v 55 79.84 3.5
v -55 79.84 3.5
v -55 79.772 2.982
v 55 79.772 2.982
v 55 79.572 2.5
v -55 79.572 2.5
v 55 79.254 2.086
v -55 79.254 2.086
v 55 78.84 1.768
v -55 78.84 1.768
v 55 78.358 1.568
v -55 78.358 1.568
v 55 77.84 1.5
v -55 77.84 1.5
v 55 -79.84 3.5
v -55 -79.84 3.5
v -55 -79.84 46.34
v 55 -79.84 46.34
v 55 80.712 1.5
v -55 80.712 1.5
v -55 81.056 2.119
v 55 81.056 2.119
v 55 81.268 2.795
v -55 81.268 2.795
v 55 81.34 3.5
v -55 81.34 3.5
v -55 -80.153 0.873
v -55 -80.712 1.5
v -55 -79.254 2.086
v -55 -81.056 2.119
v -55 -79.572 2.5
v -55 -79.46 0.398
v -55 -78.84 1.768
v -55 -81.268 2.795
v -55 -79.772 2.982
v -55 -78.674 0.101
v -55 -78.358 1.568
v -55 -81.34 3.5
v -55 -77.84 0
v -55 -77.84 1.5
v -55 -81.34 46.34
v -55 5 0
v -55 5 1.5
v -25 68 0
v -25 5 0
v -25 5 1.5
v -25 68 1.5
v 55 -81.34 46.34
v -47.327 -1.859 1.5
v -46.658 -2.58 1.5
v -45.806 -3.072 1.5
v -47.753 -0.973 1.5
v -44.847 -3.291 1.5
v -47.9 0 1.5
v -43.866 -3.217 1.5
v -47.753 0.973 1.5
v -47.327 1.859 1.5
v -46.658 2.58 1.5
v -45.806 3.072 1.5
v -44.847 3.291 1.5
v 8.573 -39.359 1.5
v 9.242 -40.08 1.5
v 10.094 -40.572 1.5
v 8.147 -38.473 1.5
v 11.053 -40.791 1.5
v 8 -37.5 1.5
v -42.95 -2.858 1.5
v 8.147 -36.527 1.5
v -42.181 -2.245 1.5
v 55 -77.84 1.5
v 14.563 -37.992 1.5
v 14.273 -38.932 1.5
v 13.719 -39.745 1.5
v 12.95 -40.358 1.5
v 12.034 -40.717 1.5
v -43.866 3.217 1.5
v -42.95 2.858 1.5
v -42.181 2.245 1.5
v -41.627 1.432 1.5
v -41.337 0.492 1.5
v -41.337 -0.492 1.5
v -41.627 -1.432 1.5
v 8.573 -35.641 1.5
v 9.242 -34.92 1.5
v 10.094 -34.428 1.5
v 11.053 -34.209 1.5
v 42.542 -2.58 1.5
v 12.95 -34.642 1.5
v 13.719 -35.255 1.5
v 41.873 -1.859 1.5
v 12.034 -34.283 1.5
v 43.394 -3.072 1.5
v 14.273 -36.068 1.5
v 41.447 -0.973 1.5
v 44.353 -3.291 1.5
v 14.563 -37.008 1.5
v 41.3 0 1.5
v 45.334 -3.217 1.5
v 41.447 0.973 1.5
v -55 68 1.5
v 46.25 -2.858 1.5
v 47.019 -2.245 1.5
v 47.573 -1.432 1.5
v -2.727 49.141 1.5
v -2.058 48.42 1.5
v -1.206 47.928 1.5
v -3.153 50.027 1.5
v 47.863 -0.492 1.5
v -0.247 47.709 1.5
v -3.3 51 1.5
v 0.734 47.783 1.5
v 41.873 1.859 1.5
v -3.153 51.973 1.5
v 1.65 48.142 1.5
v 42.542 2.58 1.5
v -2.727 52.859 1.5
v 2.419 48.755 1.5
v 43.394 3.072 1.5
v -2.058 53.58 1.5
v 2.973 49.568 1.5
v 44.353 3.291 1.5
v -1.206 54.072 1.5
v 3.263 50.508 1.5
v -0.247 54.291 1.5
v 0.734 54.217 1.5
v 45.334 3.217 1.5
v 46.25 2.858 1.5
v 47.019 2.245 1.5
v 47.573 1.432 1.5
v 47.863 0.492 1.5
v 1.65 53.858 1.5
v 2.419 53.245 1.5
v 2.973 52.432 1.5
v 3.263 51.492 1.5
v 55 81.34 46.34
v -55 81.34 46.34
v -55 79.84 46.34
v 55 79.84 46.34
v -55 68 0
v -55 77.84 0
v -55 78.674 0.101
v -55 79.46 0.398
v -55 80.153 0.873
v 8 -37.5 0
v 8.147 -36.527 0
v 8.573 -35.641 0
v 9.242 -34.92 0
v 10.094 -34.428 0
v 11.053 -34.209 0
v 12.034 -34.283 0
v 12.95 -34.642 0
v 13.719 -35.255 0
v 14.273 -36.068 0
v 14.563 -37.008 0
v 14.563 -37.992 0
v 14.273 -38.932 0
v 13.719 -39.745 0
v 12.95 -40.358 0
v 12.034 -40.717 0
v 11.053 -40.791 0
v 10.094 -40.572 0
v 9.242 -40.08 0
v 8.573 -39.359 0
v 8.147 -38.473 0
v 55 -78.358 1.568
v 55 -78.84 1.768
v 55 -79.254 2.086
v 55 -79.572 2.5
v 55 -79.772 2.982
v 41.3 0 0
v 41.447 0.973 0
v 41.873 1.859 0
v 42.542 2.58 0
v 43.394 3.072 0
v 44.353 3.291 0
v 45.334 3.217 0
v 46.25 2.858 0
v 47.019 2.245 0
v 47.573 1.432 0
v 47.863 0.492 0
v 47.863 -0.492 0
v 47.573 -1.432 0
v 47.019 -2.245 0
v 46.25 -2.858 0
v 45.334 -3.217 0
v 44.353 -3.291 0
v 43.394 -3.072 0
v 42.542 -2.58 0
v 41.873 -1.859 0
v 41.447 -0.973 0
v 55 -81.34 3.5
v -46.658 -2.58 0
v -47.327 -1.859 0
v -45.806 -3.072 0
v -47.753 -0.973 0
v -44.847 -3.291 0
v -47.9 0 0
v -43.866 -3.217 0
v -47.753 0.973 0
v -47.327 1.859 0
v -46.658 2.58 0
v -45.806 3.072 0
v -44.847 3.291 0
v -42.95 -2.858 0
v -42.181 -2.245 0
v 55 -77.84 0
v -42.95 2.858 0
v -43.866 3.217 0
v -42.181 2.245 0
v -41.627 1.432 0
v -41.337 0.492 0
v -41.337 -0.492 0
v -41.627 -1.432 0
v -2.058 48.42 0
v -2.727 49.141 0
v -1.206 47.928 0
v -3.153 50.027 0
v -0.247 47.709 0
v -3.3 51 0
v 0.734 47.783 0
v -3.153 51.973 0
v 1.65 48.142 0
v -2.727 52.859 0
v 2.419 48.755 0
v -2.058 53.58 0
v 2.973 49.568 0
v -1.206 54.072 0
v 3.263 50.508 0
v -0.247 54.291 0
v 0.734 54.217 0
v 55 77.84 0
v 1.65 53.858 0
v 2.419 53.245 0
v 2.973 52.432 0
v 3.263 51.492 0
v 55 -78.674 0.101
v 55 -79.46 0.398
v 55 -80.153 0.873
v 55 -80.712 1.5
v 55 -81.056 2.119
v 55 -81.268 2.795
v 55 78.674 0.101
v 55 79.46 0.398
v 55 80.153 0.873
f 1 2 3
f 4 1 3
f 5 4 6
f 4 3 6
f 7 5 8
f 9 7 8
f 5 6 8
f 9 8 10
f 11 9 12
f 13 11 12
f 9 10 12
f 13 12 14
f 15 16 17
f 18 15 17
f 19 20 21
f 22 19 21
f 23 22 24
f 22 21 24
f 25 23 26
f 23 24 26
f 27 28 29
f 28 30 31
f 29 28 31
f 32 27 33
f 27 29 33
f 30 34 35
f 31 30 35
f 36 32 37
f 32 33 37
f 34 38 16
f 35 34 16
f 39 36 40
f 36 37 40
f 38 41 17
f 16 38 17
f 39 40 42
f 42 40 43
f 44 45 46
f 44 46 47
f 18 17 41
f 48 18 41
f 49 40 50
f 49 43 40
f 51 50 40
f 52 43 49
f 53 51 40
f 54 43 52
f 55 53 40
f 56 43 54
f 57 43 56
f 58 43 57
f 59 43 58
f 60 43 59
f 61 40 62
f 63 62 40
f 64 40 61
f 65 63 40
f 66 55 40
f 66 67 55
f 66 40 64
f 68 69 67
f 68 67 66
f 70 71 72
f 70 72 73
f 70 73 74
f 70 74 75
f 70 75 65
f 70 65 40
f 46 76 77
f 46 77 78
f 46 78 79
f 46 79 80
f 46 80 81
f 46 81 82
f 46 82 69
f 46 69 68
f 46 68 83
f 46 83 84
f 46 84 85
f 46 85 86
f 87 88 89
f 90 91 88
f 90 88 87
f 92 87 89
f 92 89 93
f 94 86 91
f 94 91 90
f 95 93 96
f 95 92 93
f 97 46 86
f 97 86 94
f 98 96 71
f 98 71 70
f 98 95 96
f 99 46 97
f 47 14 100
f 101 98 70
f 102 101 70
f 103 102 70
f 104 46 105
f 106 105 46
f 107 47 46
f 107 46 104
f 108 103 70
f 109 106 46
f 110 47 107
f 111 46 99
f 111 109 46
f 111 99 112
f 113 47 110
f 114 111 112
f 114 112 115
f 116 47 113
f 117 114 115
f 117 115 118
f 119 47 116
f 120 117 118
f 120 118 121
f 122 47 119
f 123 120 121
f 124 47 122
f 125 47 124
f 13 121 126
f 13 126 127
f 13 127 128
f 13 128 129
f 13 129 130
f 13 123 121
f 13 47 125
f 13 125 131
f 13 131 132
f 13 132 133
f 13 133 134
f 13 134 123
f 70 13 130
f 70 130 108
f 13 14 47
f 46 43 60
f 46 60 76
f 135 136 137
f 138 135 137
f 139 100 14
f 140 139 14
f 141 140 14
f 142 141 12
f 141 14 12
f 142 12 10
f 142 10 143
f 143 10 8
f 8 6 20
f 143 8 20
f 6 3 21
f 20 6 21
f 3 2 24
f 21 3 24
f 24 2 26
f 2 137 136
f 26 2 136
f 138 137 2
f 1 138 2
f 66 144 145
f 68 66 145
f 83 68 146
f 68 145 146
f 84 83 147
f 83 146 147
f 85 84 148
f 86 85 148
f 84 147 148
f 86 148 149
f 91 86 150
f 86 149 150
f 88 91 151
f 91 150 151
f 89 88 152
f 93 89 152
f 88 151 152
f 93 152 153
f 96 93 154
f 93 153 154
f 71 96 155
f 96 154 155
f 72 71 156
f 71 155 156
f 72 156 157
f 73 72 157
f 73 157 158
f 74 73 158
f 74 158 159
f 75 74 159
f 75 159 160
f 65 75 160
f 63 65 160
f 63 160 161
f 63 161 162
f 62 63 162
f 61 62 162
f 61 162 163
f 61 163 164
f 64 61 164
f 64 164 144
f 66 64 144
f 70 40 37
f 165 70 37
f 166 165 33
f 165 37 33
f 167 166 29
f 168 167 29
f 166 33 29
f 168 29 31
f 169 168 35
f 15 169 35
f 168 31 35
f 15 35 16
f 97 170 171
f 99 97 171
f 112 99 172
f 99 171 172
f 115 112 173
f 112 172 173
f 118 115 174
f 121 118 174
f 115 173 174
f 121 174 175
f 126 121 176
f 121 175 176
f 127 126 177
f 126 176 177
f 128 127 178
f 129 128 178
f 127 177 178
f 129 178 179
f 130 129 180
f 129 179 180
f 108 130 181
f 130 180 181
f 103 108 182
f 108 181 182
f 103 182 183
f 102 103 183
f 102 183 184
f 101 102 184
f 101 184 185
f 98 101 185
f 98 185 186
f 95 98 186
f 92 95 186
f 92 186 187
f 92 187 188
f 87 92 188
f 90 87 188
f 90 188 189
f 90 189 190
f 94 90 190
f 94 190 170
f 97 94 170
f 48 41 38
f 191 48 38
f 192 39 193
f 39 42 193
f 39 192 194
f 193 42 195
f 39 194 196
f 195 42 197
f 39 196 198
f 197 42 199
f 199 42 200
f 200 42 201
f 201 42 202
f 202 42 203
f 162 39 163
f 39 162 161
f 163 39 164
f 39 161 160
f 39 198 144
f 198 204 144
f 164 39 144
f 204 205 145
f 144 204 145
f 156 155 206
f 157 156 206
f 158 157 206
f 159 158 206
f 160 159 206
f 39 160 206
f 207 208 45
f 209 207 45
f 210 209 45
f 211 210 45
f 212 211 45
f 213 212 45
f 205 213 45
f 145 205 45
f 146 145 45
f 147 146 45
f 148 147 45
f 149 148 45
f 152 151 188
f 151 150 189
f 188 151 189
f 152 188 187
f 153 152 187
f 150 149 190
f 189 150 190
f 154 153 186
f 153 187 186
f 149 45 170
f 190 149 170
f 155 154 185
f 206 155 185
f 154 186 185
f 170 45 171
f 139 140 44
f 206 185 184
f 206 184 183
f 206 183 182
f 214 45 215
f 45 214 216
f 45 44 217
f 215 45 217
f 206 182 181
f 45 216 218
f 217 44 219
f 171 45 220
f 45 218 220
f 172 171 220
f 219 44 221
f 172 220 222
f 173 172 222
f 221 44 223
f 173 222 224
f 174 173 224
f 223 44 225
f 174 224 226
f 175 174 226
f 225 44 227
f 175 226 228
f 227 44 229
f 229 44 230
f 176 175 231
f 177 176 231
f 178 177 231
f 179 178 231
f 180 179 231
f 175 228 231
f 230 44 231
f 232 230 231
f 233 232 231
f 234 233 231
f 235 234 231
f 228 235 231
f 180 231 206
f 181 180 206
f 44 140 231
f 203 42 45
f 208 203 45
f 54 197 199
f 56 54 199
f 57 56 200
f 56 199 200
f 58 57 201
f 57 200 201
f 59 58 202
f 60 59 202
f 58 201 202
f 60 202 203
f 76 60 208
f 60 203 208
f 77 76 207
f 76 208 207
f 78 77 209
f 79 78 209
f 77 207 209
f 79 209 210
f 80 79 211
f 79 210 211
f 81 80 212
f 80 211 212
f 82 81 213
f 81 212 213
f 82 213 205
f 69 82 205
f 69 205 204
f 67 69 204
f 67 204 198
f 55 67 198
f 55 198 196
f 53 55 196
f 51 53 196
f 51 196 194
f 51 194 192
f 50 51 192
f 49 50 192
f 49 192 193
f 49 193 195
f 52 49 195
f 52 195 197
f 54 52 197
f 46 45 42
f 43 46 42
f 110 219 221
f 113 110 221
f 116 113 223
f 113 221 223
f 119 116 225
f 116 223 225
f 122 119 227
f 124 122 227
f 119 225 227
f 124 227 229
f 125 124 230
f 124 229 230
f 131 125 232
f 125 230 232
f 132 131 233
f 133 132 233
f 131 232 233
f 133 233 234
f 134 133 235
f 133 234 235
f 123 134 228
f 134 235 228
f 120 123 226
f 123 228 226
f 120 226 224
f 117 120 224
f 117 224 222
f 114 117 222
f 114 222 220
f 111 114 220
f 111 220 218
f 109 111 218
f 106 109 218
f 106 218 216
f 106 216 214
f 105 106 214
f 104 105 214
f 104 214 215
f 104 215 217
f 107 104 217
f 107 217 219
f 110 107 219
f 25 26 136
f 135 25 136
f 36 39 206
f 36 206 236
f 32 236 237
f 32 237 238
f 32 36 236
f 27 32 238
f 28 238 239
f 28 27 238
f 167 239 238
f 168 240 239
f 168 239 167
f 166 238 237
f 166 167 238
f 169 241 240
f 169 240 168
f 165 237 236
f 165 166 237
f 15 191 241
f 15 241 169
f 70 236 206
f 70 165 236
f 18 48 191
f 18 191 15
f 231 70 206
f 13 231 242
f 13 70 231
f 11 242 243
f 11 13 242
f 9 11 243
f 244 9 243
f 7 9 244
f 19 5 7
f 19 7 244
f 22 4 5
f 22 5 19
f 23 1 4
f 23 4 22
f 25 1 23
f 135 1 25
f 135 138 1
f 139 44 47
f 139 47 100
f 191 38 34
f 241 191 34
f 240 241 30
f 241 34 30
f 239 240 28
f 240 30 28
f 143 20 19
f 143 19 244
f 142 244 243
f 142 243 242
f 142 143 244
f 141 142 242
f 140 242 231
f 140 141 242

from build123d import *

# Parameters (mm, degrees)
ESBO_O1_W                   = 110
ESBO_O1_H                   = 250
RESSALTO_EXTRUS_O1_DEPTH    = 1.5
FURO_COM_FOLGA_DE_M62_D     = 6.6
FURO_COM_FOLGA_DE_M62_DEPTH = 10
FURO_COM_FOLGA_DE_M62_TIP   = 1.982840043
DOBRA_START                 = -55
DOBRA_ESBO_ADA1_DEPTH       = 110
DOBRA_ESBO_ADA1_2_DEPTH     = 110
DOBRA_ESBO_ADA2_DEPTH       = 110
DOBRA_ESBO_ADA2_2_DEPTH     = 110
ESBO_O12_W                  = 30
ESBO_O12_H                  = 63
CORTE_EXTRUS_O1_DEPTH       = 10


# Read off the part's stored shape, not the designer's step: Dobra esboçada1, Dobra esboçada2
with BuildPart() as part:
    # Esboço1 → Ressalto-extrusão1 (new body)
    with BuildSketch(Plane.XY):
        Rectangle(ESBO_O1_W, ESBO_O1_H)
    extrude(amount=RESSALTO_EXTRUS_O1_DEPTH)

    # Furo com folga de M62
    with Locations(Plane.XY.offset(1.5)):
        with Locations((0, 51), (-44.6, 0), (44.6, 0), (11.3, -37.5)):
            Hole(FURO_COM_FOLGA_DE_M62_D / 2, depth=FURO_COM_FOLGA_DE_M62_DEPTH)
            with Locations((0, 0, -(FURO_COM_FOLGA_DE_M62_DEPTH + FURO_COM_FOLGA_DE_M62_TIP / 2))):  # 118° drill point
                Cone(0, FURO_COM_FOLGA_DE_M62_D / 2, FURO_COM_FOLGA_DE_M62_TIP, mode=Mode.SUBTRACT)

    # Dobra esboçada1 outline → Dobra esboçada1 (cut)
    with BuildSketch(Plane.YZ.offset(DOBRA_START)):
        with BuildLine():
            ThreePointArc((-77.840155051, 0), (-79.460340225, 0.397581589), (-80.712436374, 1.5))
            Line((-80.712436374, 1.5), (-125, 1.5))
            Line((-125, 1.5), (-125, 0))
            Line((-125, 0), (-77.840155051, 0))
        make_face()
    extrude(amount=DOBRA_ESBO_ADA1_DEPTH, mode=Mode.SUBTRACT)

    # Dobra esbo_ada1 2 outline → Dobra esbo_ada1 2 (add)
    with BuildSketch(Plane.YZ.offset(DOBRA_START)):
        with BuildLine():
            ThreePointArc((-77.840155051, 1.5), (-79.254368613, 2.085786438), (-79.840155051, 3.5))
            Line((-79.840155051, 3.5), (-79.840155051, 46.340155051))
            Line((-79.840155051, 46.340155051), (-81.340155051, 46.340155051))
            Line((-81.340155051, 46.340155051), (-81.340155051, 3.5))
            ThreePointArc((-81.340155051, 3.5), (-81.179540071, 2.451902827), (-80.712436374, 1.5))
            Line((-80.712436374, 1.5), (-77.840155051, 1.5))
        make_face()
    extrude(amount=DOBRA_ESBO_ADA1_2_DEPTH)

    # Dobra esboçada2 outline → Dobra esboçada2 (cut)
    with BuildSketch(Plane.YZ.offset(DOBRA_START)):
        with BuildLine():
            Line((125, 1.5), (80.712436374, 1.5))
            ThreePointArc((80.712436374, 1.5), (79.460340225, 0.397581589), (77.840155051, 0))
            Line((77.840155051, 0), (125, 0))
            Line((125, 0), (125, 1.5))
        make_face()
    extrude(amount=DOBRA_ESBO_ADA2_DEPTH, mode=Mode.SUBTRACT)

    # Dobra esbo_ada2 2 outline → Dobra esbo_ada2 2 (add)
    with BuildSketch(Plane.YZ.offset(DOBRA_START)):
        with BuildLine():
            Line((81.340155051, 3.5), (81.340155051, 46.340155051))
            Line((81.340155051, 46.340155051), (79.840155051, 46.340155051))
            Line((79.840155051, 46.340155051), (79.840155051, 3.5))
            ThreePointArc((79.840155051, 3.5), (79.254368613, 2.085786438), (77.840155051, 1.5))
            Line((77.840155051, 1.5), (80.712436374, 1.5))
            ThreePointArc((80.712436374, 1.5), (81.179540071, 2.451902827), (81.340155051, 3.5))
        make_face()
    extrude(amount=DOBRA_ESBO_ADA2_2_DEPTH)

    # Esboço12 → Corte-extrusão1 (cut)
    with BuildSketch(Plane(origin=(0, 0, 0), x_dir=(-1, 0, 0), z_dir=(0, 0, -1))):
        with Locations((40, 36.5)):
            Rectangle(ESBO_O12_W, ESBO_O12_H)
    extrude(amount=-CORTE_EXTRUS_O1_DEPTH, mode=Mode.SUBTRACT)


solid = part.part
